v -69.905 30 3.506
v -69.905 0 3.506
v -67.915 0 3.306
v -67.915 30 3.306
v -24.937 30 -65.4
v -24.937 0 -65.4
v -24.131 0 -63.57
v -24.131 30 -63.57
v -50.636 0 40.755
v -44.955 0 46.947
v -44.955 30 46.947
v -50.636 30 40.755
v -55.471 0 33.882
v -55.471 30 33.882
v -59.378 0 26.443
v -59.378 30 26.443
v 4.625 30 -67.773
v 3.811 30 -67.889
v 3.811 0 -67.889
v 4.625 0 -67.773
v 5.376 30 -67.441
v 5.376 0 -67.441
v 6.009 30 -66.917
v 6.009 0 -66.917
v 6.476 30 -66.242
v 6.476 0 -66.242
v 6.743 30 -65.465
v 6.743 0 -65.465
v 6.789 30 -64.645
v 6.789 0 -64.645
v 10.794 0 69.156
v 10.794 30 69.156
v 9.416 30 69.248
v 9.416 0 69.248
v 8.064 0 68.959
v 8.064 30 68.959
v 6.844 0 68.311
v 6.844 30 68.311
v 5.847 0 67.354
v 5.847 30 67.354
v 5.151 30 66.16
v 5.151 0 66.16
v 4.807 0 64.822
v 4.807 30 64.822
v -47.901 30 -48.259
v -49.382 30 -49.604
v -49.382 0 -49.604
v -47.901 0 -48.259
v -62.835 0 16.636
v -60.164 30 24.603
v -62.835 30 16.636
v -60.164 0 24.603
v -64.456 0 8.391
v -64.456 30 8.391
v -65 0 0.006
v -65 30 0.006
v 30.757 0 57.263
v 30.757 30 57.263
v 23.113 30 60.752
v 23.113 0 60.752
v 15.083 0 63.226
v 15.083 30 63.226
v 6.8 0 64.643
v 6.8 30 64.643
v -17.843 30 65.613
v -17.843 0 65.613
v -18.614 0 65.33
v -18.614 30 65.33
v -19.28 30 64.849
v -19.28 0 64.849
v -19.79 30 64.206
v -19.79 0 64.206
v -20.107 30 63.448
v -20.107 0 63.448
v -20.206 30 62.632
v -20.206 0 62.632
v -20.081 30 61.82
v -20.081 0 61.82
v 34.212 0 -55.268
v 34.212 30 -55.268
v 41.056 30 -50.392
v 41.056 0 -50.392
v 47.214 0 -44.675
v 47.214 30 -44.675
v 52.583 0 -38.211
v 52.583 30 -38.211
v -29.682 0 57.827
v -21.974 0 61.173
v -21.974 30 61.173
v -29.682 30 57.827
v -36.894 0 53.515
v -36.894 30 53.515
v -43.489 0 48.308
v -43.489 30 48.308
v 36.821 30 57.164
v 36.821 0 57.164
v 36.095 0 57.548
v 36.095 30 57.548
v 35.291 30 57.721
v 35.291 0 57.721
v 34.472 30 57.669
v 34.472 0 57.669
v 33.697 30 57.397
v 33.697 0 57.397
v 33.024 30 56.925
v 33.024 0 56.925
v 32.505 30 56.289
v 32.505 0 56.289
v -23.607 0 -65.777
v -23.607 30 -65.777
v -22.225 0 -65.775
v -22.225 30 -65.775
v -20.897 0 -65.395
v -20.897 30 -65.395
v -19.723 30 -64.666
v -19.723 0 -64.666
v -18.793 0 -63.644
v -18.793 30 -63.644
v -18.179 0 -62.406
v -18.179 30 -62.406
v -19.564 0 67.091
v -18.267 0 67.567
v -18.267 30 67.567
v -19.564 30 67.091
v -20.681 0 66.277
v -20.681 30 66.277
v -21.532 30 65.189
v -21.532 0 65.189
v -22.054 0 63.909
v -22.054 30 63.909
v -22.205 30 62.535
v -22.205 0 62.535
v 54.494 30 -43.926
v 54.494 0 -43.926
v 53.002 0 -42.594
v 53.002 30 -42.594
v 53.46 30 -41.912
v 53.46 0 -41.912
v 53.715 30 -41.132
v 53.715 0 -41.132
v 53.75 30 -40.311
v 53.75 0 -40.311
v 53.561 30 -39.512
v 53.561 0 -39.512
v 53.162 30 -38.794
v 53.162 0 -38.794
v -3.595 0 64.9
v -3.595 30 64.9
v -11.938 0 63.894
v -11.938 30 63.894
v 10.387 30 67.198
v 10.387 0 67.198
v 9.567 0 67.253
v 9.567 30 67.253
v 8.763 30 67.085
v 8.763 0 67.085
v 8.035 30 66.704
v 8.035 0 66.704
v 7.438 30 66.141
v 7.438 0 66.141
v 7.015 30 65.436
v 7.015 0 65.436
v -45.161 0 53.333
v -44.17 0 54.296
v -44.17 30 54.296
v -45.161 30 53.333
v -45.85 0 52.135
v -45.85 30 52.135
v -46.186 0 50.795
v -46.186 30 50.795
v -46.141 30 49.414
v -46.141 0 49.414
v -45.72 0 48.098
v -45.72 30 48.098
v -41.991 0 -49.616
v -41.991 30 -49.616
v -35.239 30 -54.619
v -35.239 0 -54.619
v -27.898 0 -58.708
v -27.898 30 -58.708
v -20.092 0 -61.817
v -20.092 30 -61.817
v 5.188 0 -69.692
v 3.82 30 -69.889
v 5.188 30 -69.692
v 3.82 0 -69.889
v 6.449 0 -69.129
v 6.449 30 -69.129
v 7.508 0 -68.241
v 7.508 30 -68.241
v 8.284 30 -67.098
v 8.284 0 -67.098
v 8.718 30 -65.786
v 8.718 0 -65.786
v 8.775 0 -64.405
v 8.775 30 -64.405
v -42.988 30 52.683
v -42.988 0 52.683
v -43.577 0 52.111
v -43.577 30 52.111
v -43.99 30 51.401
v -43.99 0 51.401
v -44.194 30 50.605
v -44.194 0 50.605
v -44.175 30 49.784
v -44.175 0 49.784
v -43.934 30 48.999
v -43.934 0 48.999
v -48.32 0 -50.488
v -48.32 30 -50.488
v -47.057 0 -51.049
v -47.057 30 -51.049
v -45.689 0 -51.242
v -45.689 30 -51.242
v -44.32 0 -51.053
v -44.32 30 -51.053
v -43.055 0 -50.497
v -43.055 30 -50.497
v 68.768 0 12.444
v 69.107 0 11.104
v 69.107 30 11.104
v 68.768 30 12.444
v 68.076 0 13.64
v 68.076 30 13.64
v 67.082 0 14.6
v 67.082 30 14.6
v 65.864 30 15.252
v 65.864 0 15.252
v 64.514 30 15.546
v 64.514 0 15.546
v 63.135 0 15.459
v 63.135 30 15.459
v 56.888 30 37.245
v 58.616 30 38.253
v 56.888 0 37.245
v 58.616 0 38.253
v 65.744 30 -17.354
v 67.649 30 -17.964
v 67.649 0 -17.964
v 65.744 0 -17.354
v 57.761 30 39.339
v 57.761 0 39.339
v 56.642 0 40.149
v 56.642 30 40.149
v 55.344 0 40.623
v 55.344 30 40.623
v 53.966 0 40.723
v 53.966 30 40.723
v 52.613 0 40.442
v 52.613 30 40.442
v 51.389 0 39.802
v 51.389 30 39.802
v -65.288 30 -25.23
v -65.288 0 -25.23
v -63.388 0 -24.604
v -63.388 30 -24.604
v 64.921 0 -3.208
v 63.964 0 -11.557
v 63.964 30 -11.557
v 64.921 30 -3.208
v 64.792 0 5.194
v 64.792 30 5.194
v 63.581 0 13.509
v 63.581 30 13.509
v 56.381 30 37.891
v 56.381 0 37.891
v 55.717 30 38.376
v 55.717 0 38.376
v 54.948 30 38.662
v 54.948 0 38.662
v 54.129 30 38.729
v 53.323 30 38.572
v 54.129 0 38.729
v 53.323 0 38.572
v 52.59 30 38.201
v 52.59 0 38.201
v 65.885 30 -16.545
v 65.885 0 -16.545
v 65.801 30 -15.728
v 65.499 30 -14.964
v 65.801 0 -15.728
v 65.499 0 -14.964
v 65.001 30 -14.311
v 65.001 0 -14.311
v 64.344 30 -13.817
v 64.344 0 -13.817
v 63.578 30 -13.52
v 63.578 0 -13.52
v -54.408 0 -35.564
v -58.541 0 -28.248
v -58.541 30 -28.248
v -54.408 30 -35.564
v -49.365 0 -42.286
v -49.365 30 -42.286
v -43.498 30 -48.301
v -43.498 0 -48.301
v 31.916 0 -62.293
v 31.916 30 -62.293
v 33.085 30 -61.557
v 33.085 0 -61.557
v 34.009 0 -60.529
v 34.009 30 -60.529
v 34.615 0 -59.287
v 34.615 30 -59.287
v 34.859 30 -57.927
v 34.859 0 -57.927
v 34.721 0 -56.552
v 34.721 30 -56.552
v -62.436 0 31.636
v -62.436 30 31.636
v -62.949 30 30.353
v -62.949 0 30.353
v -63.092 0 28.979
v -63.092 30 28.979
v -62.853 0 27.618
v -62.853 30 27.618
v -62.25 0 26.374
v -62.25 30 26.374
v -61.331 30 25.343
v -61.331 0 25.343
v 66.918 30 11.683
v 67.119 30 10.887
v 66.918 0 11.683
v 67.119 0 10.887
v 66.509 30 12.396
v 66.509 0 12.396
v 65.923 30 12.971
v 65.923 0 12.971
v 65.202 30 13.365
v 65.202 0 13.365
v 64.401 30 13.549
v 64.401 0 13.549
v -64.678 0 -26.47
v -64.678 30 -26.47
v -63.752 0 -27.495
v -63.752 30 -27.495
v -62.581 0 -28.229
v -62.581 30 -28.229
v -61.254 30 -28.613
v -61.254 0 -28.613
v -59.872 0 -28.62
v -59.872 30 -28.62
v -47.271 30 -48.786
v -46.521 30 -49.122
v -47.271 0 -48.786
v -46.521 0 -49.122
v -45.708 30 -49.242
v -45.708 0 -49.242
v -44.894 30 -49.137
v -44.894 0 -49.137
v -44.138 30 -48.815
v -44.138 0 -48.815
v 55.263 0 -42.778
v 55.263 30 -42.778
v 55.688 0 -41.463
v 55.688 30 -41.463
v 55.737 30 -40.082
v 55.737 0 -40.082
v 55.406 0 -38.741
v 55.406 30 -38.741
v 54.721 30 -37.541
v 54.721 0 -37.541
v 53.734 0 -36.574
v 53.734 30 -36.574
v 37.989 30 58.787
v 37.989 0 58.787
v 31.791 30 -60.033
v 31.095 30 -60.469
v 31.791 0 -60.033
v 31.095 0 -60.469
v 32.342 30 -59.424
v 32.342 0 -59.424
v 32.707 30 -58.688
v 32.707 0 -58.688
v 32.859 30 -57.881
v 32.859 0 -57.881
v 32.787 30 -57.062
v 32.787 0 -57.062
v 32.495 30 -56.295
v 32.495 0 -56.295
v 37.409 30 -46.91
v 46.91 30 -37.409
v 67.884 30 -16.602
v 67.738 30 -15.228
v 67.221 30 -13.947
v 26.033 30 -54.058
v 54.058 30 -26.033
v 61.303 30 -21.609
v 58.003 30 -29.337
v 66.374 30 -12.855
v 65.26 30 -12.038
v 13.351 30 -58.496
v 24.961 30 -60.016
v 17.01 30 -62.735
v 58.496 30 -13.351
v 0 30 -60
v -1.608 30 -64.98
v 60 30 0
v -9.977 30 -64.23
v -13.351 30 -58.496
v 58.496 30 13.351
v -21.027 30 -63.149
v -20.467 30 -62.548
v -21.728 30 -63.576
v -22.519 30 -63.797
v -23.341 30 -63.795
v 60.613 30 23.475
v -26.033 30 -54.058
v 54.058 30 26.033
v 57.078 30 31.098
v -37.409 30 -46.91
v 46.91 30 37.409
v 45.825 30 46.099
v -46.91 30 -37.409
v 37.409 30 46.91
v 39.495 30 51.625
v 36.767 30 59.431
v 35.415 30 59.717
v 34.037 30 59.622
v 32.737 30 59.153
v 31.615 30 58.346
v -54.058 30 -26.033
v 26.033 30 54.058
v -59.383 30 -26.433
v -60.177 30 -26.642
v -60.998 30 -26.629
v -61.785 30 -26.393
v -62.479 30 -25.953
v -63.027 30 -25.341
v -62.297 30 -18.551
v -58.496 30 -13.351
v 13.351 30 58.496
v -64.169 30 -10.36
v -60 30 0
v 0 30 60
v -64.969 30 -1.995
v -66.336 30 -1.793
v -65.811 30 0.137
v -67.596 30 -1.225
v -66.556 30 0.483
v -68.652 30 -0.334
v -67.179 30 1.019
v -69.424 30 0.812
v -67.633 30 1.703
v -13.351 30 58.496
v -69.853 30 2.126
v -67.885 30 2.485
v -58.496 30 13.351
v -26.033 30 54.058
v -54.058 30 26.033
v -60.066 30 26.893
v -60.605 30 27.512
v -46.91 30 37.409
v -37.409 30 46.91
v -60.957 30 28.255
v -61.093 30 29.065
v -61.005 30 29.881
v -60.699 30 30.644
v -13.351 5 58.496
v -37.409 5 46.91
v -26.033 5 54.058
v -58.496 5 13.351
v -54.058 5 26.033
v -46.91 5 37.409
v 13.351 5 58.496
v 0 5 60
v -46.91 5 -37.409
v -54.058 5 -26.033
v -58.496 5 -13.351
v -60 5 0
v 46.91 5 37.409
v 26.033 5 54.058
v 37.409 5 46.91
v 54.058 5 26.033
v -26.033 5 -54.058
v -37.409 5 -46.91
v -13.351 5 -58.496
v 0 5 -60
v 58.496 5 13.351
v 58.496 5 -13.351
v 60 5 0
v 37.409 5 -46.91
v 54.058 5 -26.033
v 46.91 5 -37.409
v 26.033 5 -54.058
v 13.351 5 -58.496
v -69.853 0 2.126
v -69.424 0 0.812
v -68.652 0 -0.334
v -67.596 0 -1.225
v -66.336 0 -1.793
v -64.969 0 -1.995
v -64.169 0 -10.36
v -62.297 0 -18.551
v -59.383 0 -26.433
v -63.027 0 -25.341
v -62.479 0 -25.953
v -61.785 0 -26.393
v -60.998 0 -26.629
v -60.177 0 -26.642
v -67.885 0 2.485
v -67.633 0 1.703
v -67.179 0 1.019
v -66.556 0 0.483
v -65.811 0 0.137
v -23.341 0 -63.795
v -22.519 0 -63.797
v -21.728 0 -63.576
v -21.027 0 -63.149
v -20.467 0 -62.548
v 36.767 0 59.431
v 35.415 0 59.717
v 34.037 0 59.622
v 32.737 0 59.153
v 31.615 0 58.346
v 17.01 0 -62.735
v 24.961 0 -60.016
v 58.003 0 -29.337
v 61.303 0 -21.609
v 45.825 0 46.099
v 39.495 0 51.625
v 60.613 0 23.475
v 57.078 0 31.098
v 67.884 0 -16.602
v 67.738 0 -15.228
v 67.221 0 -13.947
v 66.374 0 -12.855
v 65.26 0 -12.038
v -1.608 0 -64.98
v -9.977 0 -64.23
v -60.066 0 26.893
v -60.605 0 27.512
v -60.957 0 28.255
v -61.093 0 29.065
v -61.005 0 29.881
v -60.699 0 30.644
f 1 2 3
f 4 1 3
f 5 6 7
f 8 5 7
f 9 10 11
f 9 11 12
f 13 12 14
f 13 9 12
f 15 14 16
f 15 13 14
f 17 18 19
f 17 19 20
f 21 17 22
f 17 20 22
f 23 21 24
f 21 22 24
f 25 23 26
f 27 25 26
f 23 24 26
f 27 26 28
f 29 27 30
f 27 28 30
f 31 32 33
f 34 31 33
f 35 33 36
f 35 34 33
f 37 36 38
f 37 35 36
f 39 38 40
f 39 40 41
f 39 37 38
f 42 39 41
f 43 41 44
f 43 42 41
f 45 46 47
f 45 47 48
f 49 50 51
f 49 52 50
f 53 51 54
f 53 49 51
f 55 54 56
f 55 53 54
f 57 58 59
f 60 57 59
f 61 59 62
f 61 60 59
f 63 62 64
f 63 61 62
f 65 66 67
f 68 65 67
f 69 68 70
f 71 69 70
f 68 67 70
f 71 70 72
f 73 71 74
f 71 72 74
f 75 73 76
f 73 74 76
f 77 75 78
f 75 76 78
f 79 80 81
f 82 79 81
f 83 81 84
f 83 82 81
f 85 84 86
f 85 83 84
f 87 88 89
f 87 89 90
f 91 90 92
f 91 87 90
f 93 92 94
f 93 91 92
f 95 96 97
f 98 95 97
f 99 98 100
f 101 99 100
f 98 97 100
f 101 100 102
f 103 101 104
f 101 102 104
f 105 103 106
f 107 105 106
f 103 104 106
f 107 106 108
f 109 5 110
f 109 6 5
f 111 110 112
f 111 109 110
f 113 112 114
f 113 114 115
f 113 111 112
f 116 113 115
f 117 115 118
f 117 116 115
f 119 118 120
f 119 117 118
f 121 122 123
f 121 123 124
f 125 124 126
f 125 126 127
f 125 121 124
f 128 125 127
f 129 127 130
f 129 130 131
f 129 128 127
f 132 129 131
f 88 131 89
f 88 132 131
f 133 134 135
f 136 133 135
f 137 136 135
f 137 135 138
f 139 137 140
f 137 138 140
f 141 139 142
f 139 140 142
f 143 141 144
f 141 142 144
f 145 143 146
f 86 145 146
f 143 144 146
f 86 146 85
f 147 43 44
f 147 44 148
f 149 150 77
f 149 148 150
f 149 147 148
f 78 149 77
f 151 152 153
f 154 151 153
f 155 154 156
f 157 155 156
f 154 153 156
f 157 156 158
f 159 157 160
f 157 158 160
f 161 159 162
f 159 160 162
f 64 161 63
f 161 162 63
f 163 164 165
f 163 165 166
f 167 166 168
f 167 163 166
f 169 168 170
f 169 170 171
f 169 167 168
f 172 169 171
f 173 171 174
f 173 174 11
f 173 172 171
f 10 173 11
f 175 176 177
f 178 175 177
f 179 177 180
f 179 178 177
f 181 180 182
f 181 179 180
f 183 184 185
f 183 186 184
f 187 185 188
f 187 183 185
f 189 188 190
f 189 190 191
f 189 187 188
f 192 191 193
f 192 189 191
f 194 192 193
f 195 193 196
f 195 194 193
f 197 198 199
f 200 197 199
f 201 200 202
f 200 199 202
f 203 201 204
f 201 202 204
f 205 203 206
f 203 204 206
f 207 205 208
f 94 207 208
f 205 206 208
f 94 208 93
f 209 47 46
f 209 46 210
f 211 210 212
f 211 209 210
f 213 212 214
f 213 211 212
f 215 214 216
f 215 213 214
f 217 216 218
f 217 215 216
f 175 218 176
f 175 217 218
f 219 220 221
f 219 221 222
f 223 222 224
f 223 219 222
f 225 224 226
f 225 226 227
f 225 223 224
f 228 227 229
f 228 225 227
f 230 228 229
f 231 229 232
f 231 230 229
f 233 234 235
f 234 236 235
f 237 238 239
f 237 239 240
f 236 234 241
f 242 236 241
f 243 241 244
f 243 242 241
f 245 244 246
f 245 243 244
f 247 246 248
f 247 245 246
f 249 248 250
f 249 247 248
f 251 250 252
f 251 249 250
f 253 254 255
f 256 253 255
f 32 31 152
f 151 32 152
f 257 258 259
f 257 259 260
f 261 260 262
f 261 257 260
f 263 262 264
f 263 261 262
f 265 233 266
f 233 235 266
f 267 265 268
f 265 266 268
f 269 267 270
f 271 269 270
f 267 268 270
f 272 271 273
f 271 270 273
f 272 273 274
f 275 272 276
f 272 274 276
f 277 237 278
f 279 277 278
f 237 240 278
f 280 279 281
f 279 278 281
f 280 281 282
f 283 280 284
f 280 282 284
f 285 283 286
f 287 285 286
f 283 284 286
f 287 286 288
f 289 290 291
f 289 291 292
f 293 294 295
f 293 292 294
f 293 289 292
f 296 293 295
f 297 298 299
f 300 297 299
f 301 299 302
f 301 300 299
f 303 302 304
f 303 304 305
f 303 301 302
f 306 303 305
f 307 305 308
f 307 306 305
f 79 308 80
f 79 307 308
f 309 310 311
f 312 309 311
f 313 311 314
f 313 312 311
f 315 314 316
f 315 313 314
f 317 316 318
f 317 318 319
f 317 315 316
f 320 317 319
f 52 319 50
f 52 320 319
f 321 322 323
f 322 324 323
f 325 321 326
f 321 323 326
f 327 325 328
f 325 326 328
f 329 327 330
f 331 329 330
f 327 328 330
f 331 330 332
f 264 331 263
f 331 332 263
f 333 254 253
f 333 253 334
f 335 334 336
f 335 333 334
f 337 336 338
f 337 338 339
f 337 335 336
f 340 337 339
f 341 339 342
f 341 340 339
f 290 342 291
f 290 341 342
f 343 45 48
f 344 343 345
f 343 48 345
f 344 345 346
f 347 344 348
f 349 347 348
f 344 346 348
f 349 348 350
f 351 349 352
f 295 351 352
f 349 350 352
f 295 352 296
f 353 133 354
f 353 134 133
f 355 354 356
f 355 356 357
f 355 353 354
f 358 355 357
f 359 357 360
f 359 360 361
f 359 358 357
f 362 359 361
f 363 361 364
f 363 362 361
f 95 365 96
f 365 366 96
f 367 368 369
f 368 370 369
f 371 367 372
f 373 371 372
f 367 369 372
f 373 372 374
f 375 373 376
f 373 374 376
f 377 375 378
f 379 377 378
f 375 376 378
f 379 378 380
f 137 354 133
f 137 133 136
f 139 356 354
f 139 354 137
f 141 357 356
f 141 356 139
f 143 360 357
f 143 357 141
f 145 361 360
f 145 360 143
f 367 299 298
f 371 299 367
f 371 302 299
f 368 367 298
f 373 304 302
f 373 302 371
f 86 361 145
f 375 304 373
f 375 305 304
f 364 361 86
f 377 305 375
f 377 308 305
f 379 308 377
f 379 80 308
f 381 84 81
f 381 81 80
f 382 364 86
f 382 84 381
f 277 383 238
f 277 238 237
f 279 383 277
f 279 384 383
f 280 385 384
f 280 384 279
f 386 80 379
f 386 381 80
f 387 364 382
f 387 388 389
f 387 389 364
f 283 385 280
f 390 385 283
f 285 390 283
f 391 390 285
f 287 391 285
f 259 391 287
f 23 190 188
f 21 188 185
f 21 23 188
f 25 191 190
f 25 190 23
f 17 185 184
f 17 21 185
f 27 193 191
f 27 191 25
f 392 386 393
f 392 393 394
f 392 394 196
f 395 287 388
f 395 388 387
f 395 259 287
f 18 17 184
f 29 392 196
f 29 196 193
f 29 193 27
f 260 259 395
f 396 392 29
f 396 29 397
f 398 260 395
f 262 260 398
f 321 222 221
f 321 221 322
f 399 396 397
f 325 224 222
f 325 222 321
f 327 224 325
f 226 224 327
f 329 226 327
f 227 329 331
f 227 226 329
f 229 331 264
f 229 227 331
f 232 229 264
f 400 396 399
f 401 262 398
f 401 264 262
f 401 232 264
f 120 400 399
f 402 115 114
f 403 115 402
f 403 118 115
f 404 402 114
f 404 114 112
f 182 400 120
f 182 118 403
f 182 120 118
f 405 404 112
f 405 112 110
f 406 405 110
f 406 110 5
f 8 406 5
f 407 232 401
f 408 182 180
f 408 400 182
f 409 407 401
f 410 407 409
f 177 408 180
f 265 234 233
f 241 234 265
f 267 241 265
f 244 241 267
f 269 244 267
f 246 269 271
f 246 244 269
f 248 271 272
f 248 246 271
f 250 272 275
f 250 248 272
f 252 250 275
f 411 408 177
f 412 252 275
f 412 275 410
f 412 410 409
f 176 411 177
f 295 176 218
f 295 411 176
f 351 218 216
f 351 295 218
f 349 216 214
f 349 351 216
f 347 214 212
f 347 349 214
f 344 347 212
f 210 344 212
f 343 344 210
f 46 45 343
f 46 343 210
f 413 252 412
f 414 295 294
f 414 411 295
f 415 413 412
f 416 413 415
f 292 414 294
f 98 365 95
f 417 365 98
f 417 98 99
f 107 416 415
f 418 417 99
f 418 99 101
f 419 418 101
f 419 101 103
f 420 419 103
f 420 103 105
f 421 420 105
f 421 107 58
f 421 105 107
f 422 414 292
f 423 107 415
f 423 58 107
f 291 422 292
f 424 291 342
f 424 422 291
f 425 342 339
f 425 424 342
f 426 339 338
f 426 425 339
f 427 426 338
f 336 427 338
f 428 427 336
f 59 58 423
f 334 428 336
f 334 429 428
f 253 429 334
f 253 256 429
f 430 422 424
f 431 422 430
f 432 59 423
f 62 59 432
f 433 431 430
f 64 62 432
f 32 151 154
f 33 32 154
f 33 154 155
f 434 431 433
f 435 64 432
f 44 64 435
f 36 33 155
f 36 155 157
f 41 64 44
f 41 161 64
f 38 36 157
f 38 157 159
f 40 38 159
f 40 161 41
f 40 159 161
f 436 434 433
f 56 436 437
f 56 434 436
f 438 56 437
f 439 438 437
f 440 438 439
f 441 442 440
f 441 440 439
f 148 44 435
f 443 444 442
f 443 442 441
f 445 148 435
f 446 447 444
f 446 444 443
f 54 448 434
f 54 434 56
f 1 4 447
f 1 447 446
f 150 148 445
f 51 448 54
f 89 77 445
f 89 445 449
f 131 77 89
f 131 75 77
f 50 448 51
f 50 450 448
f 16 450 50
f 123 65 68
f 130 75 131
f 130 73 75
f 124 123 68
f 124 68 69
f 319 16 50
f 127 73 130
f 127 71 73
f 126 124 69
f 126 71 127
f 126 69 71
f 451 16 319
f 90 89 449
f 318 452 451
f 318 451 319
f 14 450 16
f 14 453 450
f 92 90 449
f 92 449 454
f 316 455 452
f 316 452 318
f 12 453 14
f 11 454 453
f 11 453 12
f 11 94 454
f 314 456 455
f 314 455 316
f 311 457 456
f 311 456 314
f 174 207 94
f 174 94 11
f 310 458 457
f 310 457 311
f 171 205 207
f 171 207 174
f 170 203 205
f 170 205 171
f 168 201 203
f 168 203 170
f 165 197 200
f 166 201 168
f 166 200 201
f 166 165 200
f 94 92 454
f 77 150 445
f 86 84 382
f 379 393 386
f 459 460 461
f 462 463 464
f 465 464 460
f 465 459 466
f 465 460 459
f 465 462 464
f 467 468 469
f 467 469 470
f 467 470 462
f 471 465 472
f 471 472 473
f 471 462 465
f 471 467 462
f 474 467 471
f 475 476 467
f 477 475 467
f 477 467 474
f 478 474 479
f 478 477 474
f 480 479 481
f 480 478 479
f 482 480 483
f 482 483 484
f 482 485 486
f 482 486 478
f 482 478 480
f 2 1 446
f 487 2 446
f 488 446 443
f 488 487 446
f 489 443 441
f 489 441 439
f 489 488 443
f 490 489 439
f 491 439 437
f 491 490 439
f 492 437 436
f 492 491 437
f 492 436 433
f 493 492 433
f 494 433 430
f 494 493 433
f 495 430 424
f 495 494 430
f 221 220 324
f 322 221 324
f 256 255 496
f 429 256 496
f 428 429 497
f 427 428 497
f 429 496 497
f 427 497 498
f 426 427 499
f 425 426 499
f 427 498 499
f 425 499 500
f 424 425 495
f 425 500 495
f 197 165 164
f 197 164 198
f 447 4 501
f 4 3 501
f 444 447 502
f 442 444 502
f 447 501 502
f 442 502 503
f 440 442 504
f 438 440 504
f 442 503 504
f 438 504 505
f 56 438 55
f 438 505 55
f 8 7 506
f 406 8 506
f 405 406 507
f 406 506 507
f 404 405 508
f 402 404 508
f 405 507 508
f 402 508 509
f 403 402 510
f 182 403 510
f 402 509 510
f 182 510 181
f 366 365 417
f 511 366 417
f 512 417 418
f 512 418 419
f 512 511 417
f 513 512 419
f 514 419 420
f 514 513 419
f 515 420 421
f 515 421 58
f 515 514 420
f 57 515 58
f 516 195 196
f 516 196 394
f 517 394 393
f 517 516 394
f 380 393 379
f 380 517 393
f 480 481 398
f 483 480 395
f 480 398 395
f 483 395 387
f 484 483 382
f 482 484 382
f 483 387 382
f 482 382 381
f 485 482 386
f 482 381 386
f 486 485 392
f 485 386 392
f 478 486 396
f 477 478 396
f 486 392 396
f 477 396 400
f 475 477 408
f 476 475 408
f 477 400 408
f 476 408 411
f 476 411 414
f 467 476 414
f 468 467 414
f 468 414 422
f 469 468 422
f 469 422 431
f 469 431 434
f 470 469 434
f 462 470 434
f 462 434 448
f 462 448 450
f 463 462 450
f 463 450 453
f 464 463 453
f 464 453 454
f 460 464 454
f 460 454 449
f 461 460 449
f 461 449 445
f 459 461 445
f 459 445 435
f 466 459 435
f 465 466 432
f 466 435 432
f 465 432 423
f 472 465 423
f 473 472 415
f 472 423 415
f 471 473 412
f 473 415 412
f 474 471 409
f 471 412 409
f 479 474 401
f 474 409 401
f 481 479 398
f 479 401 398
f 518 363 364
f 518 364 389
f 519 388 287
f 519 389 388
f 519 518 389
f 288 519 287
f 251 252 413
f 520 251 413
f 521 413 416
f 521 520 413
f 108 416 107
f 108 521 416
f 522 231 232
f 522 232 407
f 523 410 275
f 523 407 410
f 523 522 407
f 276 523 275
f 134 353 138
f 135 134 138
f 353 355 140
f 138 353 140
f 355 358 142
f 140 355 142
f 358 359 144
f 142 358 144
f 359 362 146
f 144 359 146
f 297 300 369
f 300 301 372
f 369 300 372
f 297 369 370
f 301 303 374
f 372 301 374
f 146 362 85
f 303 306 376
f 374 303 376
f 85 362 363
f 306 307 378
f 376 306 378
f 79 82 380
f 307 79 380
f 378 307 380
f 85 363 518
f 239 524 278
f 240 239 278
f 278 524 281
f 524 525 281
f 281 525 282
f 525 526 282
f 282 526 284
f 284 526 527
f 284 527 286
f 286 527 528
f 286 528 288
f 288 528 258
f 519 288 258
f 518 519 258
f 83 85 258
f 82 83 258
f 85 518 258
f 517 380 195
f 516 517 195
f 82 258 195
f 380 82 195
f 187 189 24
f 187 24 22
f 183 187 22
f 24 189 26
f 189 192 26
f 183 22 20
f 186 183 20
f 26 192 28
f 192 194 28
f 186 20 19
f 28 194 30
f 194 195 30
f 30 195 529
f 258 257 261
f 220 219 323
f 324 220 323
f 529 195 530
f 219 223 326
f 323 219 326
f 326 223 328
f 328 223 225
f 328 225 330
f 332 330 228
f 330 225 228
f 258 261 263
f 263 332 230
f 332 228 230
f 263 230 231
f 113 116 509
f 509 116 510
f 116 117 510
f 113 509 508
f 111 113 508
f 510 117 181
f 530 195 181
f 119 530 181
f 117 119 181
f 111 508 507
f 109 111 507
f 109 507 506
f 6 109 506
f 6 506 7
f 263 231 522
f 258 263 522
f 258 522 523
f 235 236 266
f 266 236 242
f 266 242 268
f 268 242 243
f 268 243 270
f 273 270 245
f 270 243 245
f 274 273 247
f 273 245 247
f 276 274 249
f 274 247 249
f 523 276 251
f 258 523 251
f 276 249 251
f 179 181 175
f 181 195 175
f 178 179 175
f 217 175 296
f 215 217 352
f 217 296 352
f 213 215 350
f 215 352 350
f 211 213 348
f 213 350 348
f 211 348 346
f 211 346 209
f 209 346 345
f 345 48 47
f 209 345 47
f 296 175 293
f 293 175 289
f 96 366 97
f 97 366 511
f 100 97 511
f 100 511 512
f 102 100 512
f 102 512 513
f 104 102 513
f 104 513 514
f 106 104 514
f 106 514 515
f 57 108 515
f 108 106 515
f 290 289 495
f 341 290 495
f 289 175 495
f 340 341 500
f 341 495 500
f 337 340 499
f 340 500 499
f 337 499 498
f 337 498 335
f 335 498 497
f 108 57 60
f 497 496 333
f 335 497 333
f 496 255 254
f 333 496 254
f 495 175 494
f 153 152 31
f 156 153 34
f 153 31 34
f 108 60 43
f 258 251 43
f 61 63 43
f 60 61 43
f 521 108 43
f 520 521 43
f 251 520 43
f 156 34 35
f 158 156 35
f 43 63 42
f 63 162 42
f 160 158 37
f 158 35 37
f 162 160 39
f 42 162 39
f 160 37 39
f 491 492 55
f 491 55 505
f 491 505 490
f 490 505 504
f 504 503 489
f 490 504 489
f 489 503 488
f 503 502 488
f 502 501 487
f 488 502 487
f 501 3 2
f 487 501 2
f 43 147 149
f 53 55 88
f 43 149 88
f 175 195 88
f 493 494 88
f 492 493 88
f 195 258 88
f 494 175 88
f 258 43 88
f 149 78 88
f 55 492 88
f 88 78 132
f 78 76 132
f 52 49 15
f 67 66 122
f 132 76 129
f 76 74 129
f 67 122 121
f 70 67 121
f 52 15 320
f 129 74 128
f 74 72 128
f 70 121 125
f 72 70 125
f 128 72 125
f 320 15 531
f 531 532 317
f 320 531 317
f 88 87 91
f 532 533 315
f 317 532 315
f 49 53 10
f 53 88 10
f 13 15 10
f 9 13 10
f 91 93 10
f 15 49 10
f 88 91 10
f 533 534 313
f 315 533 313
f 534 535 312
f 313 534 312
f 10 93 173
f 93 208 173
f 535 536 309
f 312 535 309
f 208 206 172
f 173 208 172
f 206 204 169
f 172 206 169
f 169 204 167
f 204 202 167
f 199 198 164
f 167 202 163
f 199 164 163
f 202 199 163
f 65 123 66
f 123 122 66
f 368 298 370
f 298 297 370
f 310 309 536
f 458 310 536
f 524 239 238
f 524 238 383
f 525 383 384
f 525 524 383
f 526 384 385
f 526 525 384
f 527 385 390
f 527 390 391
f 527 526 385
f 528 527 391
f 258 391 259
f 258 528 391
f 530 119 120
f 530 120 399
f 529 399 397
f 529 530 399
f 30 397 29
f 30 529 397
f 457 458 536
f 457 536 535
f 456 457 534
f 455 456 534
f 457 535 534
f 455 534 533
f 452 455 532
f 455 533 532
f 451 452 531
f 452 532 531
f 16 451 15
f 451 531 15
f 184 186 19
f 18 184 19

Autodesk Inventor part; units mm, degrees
ref_plane "YZ Plane" through (0, 0, 0) normal (1, 0, 0) x (0, 1, 0)
ref_plane "XZ Plane" through (0, 0, 0) normal (0, 1, 0) x (-1, 0, 0)
ref_plane "XY Plane" through (0, 0, 0) normal (0, 0, 1) x (1, 0, 0)
sketch "スケッチ1" plane through (0, 0, 0) normal (1, 0, 0) x (0, 1, 0)
  point P0 (0, 0)
sketch "スケッチ2" plane through (0, 0, 0) normal (0, 1, 0) x (-1, 0, 0)
  circle A0 centre (0, 0) radius 65
  dimension "d1" = 130
extrude "押し出し1" add sketch "スケッチ2" along normal blind 30
sketch "スケッチ3" plane through (0, 30, 0) normal (0, 1, 0) x (1, 0, 0)
  circle A0 centre (0, 0) radius 60
  dimension "d4" = 120
extrude "押し出し2" cut sketch "スケッチ3" against normal blind 25
sketch "スケッチ4" plane through (0, 0, 0) normal (0, -1, 0) x (1, 0, 0)
  circle A0 centre (0, 0) radius 65 projected
  arc A1 (-64.9694, -1.9949) -> (-61.7673, -0.8673) centre (-64.9305, 3.005) ccw
  arc A2 (-69.9053, 3.5064) -> (-61.7673, -0.8673) centre (-64.9305, 3.005) ccw
  line L0 (-64.9305, 3.005) -> (-69.9053, 3.5064) construction
  line L1 (-64.9305, 3.005) -> (-61.7673, -0.8673) construction
  arc A3 (-67.9154, 3.3058) -> (-64.6802, 0.0154) centre (-64.9305, 3.005) ccw
  line L2 (-69.9053, 3.5064) -> (-67.9154, 3.3058)
  line L3 (-60.5392, -23.6644) -> (-65.2878, -25.2298) construction
  arc A4 (-63.3884, -24.6037) -> (-59.0946, -26.2937) centre (-60.5392, -23.6644) ccw
  arc A5 (-65.2878, -25.2298) -> (-56.0745, -25.9153) centre (-60.5392, -23.6644) ccw
  line L4 (-65.2878, -25.2298) -> (-63.3884, -24.6037)
  line L5 (-45.6801, -46.242) -> (-49.3815, -49.6035) construction
  arc A6 (-47.901, -48.2589) -> (-43.291, -48.0565) centre (-45.6801, -46.242) ccw
  arc A7 (-49.3815, -49.6035) -> (-40.6859, -46.4824) centre (-45.6801, -46.242) ccw
  line L6 (-49.3815, -49.6035) -> (-47.901, -48.2589)
  line L7 (-22.9225, -60.824) -> (-24.9367, -65.4004) construction
  arc A8 (-24.131, -63.5698) -> (-20.002, -61.5098) centre (-22.9225, -60.824) ccw
  arc A9 (-24.9367, -65.4004) -> (-18.2623, -59.0122) centre (-22.9225, -60.824) ccw
  line L8 (-24.9367, -65.4004) -> (-24.131, -63.5698)
  line L9 (3.7986, -64.8889) -> (3.8199, -69.8889) construction
  arc A10 (3.8114, -67.8889) -> (6.7456, -64.3275) centre (3.7986, -64.8889) ccw
  arc A11 (3.8199, -69.8889) -> (7.319, -61.3383) centre (3.7986, -64.8889) ccw
  line L10 (3.8199, -69.8889) -> (3.8114, -67.8889)
  line L11 (29.8629, -57.734) -> (31.916, -62.293) construction
  arc A12 (31.0948, -60.4694) -> (32.3267, -56.0225) centre (29.8629, -57.734) ccw
  arc A13 (31.916, -62.293) -> (31.6347, -53.0584) centre (29.8629, -57.734) ccw
  line L12 (31.916, -62.293) -> (31.0948, -60.4694)
  line L13 (50.7636, -40.5963) -> (54.4936, -43.926) construction
  arc A14 (53.0016, -42.5941) -> (52.3183, -38.0306) centre (50.7636, -40.5963) ccw
  arc A15 (54.4936, -43.926) -> (50.4806, -35.6043) centre (50.7636, -40.5963) ccw
  line L14 (54.4936, -43.926) -> (53.0016, -42.5941)
  line L15 (62.8868, -16.4391) -> (67.6487, -17.9639) construction
  arc A16 (65.7439, -17.354) -> (63.2636, -13.4629) centre (62.8868, -16.4391) ccw
  arc A17 (67.6487, -17.9639) -> (60.5979, -11.9938) centre (62.8868, -16.4391) ccw
  line L16 (67.6487, -17.9639) -> (65.7439, -17.354)
  line L17 (64.1364, 10.5605) -> (69.1067, 11.1044) construction
  arc A18 (67.1186, 10.8868) -> (63.27, 13.4327) centre (64.1364, 10.5605) ccw
  arc A19 (69.1067, 11.1044) -> (60.2372, 13.6905) centre (64.1364, 10.5605) ccw
  line L18 (69.1067, 11.1044) -> (67.1186, 10.8868)
  line L19 (54.2962, 35.7341) -> (58.6156, 38.2526) construction
  arc A20 (56.8878, 37.2452) -> (52.3365, 38.0056) centre (54.2962, 35.7341) ccw
  arc A21 (58.6156, 38.2526) -> (49.4611, 37.0076) centre (54.2962, 35.7341) ccw
  line L20 (58.6156, 38.2526) -> (56.8878, 37.2452)
  line L21 (35.0676, 54.729) -> (37.9893, 58.7866) construction
  arc A22 (36.8206, 57.1635) -> (32.3535, 56.007) centre (35.0676, 54.729) ccw
  arc A23 (37.9893, 58.7866) -> (30.1326, 53.9257) centre (35.0676, 54.729) ccw
  line L22 (37.9893, 58.7866) -> (36.8206, 57.1635)
  line L23 (9.7756, 64.2607) -> (10.7943, 69.1558) construction
  arc A24 (10.3868, 67.1978) -> (6.7763, 64.3243) centre (9.7756, 64.2607) ccw
  arc A25 (10.7943, 69.1558) -> (5.5939, 61.5196) centre (9.7756, 64.2607) ccw
  line L24 (10.7943, 69.1558) -> (10.3868, 67.1978)
  line L25 (-17.2067, 62.6812) -> (-18.2672, 67.5674) construction
  arc A26 (-17.843, 65.6129) -> (-19.9726, 61.5193) centre (-17.2067, 62.6812) ccw
  arc A27 (-18.2672, 67.5674) -> (-19.912, 58.4762) centre (-17.2067, 62.6812) ccw
  line L26 (-18.2672, 67.5674) -> (-17.843, 65.6129)
  line L27 (-41.2138, 50.2635) -> (-44.17, 54.296) construction
  arc A28 (-42.9876, 52.683) -> (-43.268, 48.0771) centre (-41.2138, 50.2635) ccw
  arc A29 (-44.17, 54.296) -> (-41.9749, 45.3218) centre (-41.2138, 50.2635) ccw
  line L28 (-44.17, 54.296) -> (-42.9876, 52.683)
  line L29 (-58.0947, 29.1548) -> (-62.4355, 31.6363) construction
  arc A30 (-60.6992, 30.6437) -> (-59.0821, 26.3219) centre (-58.0947, 29.1548) ccw
  arc A31 (-62.4355, 31.6363) -> (-56.78, 24.3308) centre (-58.0947, 29.1548) ccw
  line L30 (-62.4355, 31.6363) -> (-60.6992, 30.6437)
  point P0 (-21.9739, 61.1731)
  point P1 (-20.0806, 61.8205)
  point P2 (4.8072, 64.822)
  point P3 (6.8001, 64.6433)
  point P4 (30.7571, 57.2626)
  point P5 (32.505, 56.2888)
  point P6 (51.3888, 39.8019)
  point P7 (52.5895, 38.2014)
  point P8 (63.1349, 15.4592)
  point P9 (63.5808, 13.5086)
  point P10 (63.9644, -11.5566)
  point P11 (63.5784, -13.5199)
  point P12 (53.7339, -36.5742)
  point P13 (52.5827, -38.2107)
  point P14 (34.2123, -55.2677)
  point P15 (32.495, -56.2945)
  point P16 (8.7751, -64.405)
  point P17 (6.7886, -64.6445)
  point P18 (-18.1794, -62.406)
  point P19 (-20.0916, -61.8169)
  point P20 (-41.9905, -49.6165)
  point P21 (-43.4978, -48.3005)
  point P22 (-58.5411, -28.2478)
  point P23 (-59.3828, -26.4326)
  point P24 (-44.9555, 46.9468)
  point P25 (-43.4892, 48.3083)
  point P26 (-60.1639, 24.603)
  point P27 (-59.3781, 26.4432)
  point P28 (-64.9694, -1.9949)
  point P29 (-65, 0.0058)
  dimension "d8" = 5
  dimension "d9" = 135
  dimension "d10" = 3
  dimension "d13" = 360
sketch "スケッチ5" plane through (0, 0, 0) normal (0, -1, 0) x (1, 0, 0)
  circle A0 centre (0, 0) radius 65 projected
  line L0 (-65, 0) -> (-64.9694, -1.9932)
sketch "スケッチ6" plane through (0, 0, 0) normal (0, -1, 0) x (1, 0, 0)
  point P0 (0, 0)
extrude "押し出し3" add sketch "スケッチ4" against normal blind 30 contours A0 A19 L18 A18 | A17 L16 A16 A0 | A0 A21 L20 A20 | A15 L14 A14 A0 | A0 A23 L22 A22 | A13 L12 A12 A0 | A0 A25 L24 A24 | A11 L10 A10 A0 | A0 A27 L26 A26 | A9 L8 A8 A0 | A0 A29 L28 A28 | A7 L6 A6 A0 | A0 A31 L30 A30 | A5 L4 A4 A0 | A0 A2 L2 A3
properties part number "wheel_rib_ant1"
